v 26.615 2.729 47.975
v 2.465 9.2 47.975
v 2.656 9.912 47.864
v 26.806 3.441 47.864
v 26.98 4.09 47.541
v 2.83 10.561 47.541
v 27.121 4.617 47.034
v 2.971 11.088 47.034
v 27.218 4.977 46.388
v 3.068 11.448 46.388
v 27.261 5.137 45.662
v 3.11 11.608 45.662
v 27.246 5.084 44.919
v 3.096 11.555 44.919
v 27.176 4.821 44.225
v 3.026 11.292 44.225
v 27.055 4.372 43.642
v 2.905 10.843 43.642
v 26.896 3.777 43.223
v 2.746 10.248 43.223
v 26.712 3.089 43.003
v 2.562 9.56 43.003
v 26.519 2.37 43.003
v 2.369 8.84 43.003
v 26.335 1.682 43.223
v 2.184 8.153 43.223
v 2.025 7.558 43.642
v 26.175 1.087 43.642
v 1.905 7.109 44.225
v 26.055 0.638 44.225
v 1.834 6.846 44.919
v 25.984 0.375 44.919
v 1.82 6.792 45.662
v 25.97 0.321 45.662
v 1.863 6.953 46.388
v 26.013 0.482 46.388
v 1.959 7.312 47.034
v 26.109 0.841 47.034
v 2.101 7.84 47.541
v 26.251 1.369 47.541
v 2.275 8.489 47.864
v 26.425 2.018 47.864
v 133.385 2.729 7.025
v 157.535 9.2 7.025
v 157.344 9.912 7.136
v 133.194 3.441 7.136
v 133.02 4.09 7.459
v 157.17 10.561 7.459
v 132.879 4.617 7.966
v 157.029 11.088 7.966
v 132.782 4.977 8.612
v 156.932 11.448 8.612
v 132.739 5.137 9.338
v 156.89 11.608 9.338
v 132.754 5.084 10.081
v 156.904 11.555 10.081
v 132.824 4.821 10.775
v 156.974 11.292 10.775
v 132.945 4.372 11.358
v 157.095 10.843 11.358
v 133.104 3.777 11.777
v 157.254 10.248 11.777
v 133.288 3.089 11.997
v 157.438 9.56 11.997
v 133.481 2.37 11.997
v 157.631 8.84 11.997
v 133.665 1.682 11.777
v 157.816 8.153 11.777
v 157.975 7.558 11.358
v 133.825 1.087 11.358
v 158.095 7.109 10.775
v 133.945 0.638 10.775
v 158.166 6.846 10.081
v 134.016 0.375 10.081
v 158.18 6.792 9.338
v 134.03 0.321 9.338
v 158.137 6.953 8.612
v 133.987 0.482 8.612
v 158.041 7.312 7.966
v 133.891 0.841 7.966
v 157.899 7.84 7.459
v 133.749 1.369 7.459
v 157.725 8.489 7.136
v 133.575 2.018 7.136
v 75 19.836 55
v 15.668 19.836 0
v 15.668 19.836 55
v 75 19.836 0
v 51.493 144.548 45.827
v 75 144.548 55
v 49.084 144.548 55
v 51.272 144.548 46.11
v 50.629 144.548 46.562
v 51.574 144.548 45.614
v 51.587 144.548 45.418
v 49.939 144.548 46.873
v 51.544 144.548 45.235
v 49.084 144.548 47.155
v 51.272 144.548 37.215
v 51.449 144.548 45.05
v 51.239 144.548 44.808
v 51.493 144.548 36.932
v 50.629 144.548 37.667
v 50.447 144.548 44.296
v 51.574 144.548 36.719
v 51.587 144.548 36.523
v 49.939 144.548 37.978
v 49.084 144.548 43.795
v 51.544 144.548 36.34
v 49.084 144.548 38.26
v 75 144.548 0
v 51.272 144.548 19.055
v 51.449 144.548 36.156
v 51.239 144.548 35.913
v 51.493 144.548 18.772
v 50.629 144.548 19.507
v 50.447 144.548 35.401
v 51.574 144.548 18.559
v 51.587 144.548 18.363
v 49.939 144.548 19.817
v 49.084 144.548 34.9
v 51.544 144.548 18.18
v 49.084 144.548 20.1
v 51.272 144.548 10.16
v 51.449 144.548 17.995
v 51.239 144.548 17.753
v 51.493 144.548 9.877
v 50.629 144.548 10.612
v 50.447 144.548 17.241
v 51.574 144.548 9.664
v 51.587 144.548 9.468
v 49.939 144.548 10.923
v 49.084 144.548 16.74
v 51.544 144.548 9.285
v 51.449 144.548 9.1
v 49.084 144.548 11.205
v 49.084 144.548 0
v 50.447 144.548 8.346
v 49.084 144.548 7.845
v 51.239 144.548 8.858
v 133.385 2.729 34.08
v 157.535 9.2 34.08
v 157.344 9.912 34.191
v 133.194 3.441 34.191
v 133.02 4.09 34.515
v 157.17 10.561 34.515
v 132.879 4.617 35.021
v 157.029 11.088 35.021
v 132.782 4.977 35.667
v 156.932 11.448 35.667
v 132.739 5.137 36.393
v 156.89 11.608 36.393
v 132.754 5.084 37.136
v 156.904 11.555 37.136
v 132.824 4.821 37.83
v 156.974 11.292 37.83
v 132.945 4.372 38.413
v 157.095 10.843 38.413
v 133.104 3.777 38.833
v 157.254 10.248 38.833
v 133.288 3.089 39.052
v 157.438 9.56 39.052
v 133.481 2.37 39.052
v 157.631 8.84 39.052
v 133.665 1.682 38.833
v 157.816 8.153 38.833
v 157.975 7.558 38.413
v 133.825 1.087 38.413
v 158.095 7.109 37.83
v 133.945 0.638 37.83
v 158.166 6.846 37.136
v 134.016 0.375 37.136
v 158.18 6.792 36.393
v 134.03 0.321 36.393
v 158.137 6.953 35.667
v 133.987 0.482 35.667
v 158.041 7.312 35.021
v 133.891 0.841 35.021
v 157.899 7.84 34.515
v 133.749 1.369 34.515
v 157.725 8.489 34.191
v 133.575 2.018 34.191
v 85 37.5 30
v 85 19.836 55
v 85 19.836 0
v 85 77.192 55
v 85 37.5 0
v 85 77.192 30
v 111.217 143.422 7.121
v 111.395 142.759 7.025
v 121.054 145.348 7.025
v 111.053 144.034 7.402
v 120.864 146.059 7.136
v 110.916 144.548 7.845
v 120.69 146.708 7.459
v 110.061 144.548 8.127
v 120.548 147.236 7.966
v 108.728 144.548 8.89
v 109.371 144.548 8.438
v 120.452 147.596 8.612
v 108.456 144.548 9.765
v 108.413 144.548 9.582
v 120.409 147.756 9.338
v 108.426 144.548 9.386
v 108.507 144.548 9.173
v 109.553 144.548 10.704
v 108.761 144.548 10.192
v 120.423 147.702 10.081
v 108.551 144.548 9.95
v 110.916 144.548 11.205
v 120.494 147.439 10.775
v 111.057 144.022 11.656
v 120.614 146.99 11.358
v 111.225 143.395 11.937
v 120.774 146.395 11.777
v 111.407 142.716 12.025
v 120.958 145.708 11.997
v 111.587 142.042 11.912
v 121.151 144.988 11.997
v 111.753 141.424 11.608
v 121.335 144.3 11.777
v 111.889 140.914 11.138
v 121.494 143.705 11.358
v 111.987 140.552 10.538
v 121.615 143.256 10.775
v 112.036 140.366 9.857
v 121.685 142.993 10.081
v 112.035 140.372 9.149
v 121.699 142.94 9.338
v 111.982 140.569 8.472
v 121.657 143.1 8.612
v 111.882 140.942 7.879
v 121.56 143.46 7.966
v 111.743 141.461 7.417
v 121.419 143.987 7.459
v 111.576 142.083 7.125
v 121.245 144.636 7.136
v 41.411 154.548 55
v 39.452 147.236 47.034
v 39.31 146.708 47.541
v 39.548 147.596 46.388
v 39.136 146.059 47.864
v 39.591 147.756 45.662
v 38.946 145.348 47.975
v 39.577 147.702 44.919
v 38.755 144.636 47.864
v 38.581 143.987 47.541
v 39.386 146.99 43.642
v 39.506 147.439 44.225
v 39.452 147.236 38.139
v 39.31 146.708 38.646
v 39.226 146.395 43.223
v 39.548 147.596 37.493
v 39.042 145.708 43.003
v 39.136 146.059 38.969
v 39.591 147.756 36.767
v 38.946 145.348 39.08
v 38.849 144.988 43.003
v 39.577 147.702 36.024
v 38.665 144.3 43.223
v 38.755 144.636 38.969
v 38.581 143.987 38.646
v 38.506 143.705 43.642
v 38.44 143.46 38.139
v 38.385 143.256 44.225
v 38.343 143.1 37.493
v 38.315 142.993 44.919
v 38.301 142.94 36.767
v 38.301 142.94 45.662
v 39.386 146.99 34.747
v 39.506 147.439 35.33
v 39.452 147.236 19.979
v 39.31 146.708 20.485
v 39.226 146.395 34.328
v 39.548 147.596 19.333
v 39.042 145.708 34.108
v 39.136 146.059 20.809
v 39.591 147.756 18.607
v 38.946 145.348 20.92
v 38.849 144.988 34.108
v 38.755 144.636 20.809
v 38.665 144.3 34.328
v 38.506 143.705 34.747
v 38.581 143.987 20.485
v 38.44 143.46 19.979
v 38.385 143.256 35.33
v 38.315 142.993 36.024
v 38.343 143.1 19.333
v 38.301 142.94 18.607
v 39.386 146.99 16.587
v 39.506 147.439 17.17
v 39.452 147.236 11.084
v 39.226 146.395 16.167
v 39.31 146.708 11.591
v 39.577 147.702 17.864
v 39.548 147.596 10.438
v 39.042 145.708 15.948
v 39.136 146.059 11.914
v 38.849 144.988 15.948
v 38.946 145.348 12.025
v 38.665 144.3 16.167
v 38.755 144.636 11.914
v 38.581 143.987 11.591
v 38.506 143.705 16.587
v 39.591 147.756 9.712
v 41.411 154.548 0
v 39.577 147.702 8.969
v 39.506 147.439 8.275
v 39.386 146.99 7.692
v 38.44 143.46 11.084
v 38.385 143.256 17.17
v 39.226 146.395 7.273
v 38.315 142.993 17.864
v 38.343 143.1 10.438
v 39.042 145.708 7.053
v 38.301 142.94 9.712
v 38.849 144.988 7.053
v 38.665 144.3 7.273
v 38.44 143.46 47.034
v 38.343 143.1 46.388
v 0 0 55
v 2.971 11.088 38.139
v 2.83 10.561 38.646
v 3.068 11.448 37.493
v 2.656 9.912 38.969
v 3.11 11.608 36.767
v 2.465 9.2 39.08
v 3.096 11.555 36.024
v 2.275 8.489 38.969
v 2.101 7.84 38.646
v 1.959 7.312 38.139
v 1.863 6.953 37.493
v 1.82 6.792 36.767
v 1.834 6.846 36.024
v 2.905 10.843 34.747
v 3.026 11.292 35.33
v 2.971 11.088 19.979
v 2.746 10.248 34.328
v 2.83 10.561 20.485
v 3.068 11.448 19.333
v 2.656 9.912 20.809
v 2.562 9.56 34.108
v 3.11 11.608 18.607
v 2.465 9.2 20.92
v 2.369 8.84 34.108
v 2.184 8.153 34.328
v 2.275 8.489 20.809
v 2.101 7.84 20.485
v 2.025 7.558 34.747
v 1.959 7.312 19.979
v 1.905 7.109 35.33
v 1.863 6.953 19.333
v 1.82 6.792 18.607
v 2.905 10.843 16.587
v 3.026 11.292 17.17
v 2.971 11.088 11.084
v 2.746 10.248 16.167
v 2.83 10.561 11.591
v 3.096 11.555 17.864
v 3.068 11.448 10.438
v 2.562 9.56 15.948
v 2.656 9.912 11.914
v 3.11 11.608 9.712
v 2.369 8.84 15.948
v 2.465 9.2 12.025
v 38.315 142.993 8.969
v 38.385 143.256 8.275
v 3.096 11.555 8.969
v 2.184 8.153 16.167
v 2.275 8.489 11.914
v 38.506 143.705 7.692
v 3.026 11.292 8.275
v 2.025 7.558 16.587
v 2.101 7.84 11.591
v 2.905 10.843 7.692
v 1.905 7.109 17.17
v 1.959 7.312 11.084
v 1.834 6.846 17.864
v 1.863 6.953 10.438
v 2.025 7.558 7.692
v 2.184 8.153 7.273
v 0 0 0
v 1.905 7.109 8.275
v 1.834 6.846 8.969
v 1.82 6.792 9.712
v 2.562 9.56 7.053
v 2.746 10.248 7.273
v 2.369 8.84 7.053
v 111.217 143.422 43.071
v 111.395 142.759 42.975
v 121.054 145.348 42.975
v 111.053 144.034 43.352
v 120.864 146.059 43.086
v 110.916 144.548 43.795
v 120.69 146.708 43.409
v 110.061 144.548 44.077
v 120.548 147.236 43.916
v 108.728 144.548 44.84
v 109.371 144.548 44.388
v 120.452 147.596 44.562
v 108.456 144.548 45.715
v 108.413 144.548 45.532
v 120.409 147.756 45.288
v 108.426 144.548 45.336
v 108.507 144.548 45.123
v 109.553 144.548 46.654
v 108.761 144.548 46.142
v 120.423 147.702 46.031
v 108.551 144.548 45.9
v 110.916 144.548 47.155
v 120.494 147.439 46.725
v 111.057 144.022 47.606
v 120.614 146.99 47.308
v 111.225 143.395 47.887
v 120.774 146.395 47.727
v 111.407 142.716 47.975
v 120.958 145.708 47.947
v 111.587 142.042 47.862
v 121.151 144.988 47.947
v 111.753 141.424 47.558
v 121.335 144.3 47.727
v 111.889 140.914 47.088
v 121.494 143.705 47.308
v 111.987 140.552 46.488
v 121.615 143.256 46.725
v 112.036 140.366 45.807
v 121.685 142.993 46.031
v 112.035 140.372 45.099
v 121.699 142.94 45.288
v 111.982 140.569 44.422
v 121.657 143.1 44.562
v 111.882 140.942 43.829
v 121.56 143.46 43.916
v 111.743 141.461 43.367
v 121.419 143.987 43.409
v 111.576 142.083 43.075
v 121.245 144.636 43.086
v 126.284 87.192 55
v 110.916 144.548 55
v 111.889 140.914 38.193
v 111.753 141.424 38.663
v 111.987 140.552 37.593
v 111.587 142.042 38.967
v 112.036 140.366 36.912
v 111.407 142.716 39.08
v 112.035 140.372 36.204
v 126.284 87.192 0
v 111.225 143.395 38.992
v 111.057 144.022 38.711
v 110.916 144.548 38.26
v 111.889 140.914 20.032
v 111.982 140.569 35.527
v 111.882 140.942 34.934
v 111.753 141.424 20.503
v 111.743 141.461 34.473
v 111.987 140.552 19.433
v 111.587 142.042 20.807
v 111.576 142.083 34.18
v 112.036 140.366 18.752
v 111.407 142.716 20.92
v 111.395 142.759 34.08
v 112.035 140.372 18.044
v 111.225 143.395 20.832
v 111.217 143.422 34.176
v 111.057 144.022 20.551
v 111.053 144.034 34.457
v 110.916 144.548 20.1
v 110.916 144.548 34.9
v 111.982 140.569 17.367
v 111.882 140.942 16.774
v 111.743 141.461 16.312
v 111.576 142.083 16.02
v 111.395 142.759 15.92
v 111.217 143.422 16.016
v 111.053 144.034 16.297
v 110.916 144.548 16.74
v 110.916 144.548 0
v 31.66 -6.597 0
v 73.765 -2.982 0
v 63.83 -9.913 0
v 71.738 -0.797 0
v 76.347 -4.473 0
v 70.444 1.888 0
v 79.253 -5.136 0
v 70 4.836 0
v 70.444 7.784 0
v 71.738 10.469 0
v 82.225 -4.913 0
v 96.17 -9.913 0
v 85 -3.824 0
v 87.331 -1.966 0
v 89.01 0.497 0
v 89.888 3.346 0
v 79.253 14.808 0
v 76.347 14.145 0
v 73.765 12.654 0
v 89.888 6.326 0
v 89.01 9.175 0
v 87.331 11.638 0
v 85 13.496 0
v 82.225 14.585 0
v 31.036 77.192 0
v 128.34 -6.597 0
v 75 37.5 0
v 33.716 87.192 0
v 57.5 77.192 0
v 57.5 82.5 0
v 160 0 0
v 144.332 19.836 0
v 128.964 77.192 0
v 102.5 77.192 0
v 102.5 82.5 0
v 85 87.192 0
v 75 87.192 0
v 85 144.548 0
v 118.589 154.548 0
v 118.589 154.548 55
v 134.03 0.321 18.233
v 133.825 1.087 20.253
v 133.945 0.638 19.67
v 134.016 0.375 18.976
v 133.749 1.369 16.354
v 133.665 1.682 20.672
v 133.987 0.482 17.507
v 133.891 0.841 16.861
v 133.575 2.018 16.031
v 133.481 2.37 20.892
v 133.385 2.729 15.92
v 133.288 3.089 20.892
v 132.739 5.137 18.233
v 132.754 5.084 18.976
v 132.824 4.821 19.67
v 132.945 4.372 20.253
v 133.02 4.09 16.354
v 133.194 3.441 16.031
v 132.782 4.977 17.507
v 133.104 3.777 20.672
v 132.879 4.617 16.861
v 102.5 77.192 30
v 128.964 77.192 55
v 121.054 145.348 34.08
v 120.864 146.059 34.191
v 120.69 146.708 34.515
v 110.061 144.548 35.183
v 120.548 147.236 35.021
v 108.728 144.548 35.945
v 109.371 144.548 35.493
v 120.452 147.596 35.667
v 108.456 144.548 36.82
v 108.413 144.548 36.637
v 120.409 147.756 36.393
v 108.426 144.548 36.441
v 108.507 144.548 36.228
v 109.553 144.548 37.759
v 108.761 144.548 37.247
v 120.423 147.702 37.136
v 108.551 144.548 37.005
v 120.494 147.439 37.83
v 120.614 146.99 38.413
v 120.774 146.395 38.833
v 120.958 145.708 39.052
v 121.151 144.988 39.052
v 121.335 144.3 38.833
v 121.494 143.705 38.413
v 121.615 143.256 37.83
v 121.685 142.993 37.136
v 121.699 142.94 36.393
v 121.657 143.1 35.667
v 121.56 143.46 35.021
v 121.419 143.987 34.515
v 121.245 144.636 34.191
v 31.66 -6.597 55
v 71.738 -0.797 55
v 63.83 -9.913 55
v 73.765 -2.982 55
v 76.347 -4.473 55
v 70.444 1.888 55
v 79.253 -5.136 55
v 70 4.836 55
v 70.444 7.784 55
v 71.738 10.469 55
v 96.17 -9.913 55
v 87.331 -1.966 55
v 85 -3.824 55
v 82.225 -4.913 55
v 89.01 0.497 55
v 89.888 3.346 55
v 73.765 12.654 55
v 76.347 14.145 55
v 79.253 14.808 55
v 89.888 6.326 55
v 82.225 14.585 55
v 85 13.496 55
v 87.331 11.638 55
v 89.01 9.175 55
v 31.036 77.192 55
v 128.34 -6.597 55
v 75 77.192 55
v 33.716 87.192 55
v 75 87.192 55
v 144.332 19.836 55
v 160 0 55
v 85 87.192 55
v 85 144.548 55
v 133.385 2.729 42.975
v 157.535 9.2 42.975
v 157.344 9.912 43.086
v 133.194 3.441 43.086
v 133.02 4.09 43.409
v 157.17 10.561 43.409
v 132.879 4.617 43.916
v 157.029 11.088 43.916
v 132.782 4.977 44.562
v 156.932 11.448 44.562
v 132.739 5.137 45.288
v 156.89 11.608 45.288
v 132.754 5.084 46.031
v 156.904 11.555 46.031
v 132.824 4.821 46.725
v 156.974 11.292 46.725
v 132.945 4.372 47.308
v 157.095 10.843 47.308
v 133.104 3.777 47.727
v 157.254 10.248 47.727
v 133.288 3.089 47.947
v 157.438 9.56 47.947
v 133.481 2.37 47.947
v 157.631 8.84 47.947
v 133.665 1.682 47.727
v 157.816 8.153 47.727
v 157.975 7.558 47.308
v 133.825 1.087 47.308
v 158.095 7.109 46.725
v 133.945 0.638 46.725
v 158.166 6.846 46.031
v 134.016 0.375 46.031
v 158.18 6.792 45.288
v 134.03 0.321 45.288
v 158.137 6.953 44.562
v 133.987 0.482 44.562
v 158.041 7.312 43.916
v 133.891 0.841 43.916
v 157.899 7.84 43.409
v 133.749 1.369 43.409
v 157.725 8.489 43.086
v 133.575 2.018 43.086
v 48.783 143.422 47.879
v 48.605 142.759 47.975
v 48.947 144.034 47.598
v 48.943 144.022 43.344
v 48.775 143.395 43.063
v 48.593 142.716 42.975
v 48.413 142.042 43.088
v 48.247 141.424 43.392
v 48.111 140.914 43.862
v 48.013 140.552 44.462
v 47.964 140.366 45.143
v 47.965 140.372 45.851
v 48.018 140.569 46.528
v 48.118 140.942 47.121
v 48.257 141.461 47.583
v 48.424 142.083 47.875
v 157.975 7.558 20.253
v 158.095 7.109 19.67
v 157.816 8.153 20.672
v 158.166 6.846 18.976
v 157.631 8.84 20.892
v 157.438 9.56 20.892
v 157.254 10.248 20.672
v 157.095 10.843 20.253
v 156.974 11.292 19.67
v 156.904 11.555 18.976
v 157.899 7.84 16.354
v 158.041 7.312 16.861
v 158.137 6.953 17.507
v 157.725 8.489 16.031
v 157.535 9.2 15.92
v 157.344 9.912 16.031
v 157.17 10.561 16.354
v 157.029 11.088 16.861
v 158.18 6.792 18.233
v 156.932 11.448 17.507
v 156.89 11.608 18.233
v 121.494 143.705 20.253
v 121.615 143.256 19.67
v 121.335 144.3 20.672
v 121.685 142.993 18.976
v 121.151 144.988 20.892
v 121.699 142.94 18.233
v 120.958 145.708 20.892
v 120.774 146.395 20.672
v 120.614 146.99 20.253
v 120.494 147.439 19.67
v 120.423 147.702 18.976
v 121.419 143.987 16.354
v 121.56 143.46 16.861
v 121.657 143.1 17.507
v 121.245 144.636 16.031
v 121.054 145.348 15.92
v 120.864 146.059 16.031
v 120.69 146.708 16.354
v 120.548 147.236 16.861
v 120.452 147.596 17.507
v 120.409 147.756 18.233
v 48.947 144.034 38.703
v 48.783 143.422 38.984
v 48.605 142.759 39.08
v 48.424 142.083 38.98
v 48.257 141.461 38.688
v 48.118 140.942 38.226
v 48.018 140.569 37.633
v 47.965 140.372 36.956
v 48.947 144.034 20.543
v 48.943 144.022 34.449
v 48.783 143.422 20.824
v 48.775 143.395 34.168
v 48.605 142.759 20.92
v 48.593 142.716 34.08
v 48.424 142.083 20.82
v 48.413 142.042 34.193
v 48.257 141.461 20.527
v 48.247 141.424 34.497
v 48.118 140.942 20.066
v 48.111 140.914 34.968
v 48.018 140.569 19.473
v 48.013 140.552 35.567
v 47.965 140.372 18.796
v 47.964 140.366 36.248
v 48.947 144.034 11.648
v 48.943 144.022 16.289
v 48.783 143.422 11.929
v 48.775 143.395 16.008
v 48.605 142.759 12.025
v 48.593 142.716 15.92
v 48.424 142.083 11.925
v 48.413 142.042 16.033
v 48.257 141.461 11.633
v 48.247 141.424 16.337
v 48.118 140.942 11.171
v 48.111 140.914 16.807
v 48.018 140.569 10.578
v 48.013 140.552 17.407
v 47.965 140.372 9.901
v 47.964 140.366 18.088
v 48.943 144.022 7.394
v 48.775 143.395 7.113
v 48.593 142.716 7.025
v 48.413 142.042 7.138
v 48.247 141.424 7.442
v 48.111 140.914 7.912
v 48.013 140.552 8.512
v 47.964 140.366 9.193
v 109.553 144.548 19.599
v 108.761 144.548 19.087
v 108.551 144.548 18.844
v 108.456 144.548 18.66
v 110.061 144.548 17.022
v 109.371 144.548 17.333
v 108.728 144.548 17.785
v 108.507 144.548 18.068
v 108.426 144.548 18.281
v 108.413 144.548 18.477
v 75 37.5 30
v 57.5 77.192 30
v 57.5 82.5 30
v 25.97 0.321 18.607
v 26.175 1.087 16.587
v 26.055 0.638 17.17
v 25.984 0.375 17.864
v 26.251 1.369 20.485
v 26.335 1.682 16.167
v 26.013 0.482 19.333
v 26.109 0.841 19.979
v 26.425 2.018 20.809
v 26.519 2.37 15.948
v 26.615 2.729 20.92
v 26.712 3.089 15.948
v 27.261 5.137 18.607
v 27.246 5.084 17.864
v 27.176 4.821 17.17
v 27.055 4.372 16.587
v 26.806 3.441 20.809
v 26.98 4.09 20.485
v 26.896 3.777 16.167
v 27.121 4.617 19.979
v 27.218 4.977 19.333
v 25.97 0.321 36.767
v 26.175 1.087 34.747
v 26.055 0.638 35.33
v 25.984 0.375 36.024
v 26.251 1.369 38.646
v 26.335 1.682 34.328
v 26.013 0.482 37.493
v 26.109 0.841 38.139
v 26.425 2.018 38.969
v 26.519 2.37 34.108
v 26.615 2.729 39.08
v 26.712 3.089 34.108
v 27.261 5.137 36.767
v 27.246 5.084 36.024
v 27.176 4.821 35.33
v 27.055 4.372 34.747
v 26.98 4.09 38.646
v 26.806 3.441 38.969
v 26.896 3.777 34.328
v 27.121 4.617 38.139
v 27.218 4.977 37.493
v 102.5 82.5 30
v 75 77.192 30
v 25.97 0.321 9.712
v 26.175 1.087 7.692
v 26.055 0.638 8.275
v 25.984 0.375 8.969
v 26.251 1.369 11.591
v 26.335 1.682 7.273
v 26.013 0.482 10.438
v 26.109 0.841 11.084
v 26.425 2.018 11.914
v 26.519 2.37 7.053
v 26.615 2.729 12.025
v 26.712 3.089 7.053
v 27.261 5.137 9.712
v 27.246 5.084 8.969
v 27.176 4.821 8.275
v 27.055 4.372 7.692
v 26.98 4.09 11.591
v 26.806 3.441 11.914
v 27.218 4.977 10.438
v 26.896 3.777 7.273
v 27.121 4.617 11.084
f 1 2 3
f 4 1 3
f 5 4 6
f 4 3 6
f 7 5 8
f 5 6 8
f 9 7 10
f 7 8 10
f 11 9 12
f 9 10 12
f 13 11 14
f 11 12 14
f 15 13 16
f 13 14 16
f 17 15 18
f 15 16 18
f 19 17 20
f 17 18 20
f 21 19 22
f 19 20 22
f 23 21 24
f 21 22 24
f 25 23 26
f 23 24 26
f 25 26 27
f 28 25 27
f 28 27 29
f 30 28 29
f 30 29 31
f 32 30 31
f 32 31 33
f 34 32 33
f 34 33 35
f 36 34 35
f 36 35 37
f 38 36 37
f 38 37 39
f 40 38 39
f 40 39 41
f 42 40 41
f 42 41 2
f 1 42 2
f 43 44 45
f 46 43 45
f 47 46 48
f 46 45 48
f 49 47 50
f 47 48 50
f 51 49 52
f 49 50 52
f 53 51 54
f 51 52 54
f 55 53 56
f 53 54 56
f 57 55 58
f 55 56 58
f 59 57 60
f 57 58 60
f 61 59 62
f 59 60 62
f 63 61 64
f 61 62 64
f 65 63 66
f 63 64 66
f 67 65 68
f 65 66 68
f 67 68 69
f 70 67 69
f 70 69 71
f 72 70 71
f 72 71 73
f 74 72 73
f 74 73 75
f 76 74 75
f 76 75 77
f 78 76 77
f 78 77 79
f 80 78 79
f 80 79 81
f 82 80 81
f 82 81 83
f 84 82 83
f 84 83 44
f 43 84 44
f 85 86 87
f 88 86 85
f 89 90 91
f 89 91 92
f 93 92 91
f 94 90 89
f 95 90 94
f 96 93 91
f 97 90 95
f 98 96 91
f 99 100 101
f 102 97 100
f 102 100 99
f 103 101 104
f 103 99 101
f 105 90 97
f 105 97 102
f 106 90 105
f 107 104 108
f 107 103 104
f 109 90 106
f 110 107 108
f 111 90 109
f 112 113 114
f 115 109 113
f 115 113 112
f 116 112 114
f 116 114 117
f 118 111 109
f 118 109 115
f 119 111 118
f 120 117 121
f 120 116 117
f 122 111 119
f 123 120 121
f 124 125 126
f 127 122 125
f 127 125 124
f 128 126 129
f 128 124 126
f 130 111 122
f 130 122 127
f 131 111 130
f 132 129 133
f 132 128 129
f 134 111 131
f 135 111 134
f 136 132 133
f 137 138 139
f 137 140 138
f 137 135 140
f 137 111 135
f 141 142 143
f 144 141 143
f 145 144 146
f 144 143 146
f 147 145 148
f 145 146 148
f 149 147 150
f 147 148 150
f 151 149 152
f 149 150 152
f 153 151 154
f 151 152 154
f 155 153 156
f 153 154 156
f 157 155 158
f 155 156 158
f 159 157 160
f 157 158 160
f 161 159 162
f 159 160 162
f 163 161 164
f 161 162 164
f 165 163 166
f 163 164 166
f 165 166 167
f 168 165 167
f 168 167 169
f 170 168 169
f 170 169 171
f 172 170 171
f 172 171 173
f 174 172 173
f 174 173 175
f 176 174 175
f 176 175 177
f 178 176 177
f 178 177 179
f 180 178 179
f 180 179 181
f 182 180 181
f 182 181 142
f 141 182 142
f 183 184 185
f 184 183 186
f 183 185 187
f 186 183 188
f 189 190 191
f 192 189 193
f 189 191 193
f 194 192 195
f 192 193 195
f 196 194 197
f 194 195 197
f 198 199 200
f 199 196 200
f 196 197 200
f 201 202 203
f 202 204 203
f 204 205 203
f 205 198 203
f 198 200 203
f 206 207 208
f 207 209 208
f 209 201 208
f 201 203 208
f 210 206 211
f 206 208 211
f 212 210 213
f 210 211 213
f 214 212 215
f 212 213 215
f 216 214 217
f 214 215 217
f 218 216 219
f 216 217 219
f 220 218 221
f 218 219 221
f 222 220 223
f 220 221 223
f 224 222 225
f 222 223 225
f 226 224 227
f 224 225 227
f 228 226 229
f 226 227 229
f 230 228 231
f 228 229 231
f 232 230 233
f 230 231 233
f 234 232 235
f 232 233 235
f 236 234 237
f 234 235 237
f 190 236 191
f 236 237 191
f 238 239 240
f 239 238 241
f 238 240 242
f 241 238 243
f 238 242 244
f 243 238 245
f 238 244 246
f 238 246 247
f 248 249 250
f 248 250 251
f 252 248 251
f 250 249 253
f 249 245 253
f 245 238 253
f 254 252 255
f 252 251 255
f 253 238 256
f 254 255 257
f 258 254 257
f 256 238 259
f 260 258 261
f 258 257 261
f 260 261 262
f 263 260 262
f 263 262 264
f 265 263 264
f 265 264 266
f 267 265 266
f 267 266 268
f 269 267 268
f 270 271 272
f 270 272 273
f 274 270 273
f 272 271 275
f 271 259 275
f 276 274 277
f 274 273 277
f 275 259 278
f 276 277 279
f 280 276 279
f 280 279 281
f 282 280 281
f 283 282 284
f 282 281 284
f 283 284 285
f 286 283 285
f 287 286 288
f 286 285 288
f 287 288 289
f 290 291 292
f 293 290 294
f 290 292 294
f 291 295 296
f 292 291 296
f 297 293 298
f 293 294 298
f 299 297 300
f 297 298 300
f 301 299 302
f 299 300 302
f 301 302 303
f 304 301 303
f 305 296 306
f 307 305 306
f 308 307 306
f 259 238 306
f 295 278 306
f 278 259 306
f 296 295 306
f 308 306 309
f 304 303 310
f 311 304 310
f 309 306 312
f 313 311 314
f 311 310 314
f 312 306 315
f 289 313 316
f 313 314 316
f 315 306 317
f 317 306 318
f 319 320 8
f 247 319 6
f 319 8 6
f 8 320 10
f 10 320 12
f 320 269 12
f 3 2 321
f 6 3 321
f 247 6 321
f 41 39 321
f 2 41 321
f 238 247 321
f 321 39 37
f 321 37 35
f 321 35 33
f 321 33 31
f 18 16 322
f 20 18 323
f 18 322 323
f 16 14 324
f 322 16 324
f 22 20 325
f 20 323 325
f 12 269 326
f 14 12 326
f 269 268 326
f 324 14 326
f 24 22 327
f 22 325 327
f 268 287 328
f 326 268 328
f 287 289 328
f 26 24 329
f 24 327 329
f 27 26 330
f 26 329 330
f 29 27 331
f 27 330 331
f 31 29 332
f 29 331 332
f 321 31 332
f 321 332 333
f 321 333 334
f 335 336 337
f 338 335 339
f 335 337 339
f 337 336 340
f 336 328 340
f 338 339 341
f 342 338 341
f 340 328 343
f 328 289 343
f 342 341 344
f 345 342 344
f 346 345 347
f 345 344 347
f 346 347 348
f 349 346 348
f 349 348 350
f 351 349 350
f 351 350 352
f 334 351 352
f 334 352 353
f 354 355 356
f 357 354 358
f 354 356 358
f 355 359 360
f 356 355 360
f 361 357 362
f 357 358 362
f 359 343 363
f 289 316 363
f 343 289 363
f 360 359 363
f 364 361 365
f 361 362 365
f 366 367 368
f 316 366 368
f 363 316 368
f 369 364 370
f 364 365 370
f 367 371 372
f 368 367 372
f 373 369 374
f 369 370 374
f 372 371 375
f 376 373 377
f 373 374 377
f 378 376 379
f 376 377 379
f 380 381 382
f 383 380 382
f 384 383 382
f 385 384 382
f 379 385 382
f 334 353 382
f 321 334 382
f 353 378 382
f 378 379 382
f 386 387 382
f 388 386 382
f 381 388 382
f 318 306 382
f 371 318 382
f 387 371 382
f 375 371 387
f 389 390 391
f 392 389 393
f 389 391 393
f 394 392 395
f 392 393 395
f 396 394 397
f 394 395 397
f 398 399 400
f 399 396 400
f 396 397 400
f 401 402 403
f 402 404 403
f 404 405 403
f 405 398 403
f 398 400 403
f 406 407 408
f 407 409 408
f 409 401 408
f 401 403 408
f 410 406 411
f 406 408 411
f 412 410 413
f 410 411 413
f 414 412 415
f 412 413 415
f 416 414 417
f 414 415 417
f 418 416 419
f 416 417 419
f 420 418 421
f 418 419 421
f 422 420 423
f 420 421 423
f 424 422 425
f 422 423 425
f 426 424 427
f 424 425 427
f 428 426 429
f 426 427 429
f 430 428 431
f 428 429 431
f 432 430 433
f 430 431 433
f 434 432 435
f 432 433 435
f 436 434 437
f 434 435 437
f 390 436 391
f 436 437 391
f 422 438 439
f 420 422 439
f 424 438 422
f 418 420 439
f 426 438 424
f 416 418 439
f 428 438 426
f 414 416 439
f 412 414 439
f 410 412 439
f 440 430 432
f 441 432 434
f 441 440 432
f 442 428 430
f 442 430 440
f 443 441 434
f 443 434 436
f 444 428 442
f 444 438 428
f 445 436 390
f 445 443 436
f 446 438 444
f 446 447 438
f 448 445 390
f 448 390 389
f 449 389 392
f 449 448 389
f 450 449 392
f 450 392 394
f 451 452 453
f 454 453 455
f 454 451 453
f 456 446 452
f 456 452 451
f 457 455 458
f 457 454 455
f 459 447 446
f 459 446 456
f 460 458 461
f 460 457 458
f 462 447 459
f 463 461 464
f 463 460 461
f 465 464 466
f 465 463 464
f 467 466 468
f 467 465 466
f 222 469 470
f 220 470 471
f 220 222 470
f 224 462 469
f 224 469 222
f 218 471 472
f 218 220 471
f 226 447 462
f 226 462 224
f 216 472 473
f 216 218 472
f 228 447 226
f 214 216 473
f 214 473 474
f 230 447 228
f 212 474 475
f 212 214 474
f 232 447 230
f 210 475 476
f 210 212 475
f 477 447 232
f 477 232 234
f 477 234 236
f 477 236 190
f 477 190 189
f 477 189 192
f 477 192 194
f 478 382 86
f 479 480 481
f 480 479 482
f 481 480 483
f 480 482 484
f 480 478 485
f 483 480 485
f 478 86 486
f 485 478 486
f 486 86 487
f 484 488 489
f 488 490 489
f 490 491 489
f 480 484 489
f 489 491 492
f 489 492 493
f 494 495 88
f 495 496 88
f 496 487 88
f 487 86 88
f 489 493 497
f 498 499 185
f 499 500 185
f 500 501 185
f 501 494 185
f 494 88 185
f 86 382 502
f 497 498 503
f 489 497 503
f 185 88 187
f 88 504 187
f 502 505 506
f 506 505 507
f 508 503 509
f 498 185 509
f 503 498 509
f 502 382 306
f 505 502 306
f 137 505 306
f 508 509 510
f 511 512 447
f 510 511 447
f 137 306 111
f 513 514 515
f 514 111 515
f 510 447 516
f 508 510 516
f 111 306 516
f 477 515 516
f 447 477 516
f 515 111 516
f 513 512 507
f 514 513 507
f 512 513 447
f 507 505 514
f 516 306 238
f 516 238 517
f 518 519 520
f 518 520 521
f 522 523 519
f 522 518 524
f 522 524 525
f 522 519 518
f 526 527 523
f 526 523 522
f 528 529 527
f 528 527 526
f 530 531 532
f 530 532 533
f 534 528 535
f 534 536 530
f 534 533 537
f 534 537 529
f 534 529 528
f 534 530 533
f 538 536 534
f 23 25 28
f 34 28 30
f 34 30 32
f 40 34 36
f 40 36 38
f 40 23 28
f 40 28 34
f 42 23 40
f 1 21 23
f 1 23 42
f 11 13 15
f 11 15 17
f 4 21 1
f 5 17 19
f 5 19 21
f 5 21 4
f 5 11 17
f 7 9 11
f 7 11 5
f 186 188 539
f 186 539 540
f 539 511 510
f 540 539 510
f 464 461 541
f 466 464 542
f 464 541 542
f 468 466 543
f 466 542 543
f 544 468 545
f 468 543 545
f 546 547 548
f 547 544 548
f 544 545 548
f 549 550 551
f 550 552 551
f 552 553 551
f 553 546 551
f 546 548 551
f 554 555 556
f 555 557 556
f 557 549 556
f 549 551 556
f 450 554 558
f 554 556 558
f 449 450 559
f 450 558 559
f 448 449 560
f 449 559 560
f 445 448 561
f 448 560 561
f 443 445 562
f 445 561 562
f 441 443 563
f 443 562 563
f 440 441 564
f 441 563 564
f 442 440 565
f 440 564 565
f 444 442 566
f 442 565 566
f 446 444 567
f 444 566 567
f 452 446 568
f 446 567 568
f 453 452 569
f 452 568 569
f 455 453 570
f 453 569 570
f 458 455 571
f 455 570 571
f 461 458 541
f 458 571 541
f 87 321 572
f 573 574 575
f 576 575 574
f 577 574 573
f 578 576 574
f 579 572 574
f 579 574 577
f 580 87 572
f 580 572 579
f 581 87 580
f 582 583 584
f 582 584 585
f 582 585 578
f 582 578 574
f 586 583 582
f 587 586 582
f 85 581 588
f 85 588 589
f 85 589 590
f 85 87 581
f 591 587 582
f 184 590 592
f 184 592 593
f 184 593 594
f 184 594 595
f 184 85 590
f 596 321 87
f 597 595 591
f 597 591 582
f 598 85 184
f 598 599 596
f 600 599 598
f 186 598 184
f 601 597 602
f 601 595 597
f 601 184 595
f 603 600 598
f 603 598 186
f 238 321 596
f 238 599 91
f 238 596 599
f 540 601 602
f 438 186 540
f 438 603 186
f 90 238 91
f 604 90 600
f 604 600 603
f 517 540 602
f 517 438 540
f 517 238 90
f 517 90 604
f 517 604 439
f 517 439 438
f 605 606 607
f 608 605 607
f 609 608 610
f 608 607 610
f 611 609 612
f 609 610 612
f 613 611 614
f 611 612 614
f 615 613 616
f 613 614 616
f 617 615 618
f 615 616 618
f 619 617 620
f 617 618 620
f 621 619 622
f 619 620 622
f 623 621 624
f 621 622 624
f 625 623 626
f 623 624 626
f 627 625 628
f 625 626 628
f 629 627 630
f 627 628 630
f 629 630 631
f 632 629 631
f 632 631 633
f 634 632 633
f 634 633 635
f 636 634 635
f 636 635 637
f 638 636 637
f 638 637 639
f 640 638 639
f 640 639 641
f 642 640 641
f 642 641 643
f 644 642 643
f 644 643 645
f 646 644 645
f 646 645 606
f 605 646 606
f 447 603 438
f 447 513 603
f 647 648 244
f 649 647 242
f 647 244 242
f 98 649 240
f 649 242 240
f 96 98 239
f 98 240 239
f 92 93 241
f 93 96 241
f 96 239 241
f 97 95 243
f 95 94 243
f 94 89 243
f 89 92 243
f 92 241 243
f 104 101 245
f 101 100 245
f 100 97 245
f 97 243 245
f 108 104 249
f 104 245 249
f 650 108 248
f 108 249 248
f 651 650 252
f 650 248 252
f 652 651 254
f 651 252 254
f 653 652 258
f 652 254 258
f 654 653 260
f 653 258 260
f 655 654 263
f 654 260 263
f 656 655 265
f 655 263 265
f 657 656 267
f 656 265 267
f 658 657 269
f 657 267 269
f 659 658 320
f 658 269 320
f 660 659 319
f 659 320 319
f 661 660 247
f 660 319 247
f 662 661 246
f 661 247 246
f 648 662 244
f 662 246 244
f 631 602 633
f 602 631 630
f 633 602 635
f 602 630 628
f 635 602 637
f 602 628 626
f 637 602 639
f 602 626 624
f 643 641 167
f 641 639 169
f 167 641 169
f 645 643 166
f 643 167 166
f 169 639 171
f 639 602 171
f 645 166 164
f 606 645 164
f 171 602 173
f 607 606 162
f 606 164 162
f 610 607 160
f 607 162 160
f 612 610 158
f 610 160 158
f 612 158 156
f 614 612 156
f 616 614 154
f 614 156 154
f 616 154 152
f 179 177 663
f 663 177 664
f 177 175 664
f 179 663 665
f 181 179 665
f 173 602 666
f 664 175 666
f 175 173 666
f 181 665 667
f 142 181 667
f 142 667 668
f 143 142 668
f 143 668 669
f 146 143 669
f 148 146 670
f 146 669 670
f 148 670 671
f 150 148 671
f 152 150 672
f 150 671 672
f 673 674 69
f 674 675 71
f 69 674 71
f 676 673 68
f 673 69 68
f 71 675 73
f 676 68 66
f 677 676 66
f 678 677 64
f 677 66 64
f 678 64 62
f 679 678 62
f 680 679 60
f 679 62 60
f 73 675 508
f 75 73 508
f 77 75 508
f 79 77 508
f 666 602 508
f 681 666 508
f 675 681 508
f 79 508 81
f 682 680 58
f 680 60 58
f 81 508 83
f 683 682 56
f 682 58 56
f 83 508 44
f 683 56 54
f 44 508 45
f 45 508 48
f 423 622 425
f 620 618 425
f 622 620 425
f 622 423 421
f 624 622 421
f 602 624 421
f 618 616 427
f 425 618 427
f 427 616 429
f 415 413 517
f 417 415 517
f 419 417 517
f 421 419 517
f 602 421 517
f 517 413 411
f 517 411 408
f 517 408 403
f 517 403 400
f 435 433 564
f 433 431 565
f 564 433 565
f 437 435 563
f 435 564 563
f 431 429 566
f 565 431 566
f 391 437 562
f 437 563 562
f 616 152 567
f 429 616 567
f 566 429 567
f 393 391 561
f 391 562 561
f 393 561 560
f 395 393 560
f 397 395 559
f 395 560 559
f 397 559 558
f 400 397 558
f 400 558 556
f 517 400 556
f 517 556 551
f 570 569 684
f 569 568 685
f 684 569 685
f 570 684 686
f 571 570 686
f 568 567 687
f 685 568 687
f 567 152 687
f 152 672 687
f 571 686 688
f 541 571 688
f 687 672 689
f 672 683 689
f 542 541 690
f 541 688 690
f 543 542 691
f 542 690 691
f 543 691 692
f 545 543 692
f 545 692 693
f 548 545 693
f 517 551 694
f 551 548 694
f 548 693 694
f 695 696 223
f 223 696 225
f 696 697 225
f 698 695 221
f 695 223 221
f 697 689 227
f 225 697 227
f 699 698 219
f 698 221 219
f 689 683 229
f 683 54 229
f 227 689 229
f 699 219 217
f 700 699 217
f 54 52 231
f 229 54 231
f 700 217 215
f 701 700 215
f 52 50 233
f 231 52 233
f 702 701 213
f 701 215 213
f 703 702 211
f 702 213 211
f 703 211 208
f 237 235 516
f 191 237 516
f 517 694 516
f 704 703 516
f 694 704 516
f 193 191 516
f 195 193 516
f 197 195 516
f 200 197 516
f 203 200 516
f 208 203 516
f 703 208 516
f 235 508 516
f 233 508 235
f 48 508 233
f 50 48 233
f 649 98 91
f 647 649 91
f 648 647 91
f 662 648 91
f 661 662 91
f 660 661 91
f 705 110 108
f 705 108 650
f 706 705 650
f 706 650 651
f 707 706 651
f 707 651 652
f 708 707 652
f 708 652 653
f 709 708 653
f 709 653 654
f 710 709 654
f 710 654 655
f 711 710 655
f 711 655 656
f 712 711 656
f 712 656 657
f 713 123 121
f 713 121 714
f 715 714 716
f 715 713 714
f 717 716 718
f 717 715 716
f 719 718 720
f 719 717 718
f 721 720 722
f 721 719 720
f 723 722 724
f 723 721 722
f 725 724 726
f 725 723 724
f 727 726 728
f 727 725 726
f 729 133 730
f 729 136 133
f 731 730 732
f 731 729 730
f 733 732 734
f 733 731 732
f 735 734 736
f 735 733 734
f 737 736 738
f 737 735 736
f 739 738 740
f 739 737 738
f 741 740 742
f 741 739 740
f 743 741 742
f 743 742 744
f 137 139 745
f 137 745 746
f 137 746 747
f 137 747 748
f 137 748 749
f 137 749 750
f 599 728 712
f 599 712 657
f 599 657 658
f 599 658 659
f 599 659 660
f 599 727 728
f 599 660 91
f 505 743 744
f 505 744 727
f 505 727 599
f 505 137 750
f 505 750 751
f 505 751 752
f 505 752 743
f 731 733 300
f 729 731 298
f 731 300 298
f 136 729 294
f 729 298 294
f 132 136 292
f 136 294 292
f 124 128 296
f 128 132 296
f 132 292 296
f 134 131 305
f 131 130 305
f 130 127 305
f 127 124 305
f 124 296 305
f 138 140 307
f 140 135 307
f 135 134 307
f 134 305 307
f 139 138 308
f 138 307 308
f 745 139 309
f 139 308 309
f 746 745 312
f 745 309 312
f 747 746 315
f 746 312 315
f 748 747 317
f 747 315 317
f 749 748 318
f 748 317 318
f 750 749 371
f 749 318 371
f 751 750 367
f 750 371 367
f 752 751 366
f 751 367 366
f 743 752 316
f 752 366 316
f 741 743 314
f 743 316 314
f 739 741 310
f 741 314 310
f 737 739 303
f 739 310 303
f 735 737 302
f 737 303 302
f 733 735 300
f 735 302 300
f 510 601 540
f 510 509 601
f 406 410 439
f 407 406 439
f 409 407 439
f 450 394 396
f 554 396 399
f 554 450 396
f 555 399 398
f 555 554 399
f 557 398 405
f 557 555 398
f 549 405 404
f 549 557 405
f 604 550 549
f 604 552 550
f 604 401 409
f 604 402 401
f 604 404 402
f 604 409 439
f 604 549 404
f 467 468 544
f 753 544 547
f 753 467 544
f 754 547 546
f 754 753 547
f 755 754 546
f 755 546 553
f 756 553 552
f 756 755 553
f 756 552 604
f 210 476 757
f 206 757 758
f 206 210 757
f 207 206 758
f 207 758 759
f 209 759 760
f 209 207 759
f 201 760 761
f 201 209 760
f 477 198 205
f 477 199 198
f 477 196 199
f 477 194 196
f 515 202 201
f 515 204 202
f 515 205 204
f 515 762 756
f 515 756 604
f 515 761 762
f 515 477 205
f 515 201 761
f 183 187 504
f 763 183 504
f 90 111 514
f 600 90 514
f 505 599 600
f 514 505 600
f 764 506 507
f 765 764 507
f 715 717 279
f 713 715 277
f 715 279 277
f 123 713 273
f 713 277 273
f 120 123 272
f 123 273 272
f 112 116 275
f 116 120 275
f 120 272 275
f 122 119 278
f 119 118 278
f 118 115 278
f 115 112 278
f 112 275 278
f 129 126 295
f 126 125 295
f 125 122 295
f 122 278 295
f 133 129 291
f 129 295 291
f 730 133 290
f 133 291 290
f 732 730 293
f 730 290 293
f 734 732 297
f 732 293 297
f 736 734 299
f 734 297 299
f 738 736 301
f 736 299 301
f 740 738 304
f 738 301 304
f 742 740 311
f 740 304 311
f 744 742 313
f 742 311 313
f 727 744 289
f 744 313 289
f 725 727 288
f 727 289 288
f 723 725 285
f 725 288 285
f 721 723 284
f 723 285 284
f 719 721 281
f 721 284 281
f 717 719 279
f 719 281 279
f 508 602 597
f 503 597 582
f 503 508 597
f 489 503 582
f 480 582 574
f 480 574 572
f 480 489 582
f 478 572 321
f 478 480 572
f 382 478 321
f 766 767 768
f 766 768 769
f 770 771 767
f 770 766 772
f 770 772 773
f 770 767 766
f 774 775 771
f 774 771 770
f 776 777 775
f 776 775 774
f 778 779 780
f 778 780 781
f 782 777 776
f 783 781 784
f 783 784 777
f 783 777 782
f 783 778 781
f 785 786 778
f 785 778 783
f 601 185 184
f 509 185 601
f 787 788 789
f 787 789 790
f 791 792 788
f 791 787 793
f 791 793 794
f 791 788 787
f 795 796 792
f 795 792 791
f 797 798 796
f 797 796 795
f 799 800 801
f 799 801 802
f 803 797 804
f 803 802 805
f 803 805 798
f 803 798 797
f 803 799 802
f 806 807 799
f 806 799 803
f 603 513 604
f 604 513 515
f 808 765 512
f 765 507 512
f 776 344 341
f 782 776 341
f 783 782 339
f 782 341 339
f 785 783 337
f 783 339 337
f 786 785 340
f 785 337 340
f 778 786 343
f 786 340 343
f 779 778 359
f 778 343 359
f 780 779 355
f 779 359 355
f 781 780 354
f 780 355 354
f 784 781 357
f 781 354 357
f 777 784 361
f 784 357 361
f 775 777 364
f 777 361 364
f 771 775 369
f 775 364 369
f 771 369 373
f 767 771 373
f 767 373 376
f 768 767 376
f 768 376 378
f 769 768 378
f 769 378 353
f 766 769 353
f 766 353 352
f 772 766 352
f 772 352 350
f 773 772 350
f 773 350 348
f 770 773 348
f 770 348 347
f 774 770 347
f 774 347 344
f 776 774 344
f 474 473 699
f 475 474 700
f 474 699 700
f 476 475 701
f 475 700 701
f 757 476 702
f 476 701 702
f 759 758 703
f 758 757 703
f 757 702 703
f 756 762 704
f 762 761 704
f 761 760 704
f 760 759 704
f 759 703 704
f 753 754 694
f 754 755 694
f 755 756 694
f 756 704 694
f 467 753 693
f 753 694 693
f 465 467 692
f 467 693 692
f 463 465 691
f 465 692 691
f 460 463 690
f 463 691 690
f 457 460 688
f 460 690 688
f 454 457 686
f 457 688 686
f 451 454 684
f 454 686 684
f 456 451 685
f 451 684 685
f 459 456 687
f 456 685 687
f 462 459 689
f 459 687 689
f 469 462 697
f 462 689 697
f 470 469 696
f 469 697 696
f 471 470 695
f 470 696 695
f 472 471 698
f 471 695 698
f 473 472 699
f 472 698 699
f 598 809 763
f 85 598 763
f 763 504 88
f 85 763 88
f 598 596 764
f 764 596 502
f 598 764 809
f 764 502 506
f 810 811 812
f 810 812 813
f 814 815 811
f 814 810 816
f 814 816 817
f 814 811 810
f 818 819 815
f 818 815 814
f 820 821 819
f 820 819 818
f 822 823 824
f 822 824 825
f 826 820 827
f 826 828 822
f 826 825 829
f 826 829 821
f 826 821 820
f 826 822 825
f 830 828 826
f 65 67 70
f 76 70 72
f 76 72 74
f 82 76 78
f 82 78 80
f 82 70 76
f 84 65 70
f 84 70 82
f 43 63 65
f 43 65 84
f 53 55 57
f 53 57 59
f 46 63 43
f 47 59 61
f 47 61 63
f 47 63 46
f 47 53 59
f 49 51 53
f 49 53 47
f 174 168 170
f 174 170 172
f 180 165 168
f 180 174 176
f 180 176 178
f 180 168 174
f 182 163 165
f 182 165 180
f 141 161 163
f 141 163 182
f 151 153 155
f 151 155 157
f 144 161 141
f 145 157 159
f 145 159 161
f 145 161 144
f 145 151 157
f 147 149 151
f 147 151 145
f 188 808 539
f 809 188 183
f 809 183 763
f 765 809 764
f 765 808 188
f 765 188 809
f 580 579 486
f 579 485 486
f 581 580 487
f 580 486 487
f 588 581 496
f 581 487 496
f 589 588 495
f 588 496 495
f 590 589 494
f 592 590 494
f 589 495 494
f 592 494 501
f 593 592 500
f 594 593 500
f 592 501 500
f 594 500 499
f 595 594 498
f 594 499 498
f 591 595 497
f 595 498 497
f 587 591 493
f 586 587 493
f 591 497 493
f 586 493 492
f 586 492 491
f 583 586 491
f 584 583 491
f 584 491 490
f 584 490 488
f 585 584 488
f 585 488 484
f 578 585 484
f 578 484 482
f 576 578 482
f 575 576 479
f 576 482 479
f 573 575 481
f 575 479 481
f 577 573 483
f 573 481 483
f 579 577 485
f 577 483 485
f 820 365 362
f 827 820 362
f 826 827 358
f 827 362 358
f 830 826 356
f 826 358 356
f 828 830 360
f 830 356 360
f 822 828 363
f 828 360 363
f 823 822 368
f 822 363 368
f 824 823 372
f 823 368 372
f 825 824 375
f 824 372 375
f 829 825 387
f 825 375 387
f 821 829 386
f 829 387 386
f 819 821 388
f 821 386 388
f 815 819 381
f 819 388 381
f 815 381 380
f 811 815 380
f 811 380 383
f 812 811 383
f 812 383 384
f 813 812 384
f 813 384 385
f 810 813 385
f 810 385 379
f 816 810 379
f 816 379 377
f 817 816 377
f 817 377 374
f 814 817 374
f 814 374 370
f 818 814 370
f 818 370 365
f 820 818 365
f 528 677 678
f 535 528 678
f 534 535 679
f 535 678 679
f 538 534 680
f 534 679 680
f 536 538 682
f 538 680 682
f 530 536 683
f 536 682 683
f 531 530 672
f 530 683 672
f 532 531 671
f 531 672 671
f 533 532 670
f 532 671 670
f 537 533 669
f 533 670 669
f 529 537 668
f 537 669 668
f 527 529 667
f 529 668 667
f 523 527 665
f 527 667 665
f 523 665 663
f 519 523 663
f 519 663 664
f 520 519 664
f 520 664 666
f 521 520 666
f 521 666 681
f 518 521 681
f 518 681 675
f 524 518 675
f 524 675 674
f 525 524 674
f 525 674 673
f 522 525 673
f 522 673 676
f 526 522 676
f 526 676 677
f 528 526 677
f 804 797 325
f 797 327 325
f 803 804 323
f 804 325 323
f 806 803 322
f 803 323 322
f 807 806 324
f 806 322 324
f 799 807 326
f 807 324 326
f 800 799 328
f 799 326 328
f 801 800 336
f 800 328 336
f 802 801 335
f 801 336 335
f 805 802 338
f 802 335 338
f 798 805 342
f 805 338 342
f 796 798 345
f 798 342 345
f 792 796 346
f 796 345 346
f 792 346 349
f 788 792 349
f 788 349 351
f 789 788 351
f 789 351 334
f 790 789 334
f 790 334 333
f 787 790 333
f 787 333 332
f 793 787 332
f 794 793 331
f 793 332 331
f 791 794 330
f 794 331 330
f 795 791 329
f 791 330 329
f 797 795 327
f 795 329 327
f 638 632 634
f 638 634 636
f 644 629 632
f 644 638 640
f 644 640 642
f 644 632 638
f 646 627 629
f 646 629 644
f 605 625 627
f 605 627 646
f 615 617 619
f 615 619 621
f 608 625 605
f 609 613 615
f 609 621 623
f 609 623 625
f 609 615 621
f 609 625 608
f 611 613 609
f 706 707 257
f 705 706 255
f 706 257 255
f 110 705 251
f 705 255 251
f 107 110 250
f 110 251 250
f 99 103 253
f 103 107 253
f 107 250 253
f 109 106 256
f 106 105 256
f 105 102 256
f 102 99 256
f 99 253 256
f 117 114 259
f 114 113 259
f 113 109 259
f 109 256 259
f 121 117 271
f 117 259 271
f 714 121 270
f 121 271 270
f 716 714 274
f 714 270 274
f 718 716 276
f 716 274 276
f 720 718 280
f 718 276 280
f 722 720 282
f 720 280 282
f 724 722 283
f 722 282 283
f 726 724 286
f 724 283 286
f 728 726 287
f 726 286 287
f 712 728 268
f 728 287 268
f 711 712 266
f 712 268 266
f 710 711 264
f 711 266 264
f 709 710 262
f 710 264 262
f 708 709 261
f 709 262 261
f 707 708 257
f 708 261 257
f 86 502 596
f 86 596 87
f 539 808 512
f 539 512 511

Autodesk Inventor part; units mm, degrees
ref_plane "YZ Plane" through (0, 0, 0) normal (1, 0, 0) x (0, 1, 0)
ref_plane "XZ Plane" through (0, 0, 0) normal (0, 1, 0) x (-1, 0, 0)
ref_plane "XY Plane" through (0, 0, 0) normal (0, 0, 1) x (1, 0, 0)
sketch "Sketch1" plane through (0, 0, 0) normal (0, 0, 1) x (1, 0, 0)
  line L0 (0, 0) -> (160, 0)
  line L1 (160, 0) -> (118.589, 154.5481)
  line L2 (41.411, 154.5481) -> (0, 0)
  line L3 (41.411, 154.5481) -> (118.589, 154.5481)
  dimension "d0" = 160
  dimension "d1" = 160
  dimension "d2" = 75
  dimension "d8" = 75
extrude "Extrusion1" add sketch "Sketch1" along normal blind 55
sketch "Sketch7" plane through (0, 0, 0) normal (0, 0, -1) x (-1, 0, 0)
  circle A0 centre (-80, 304.672) radius 315 construction
  line L0 (0, 0) -> (-160, 0) projected
  arc A1 (-160, 0) -> (0, 0) centre (-80, 304.672) ccw
  dimension "d28" = 630
extrude "Extrusion6" add sketch "Sketch7" against normal blind 55
sketch "Sketch19" plane through (0, 0, 0) normal (0, 0, -1) x (-1, 0, 0)
  circle A0 centre (-80, 4.836) radius 10
  line L0 (-118.589, 154.5481) -> (-41.411, 154.5481) projected
  line L1 (-80, 154.5481) -> (-80, -10.328)
  arc A1 (-160, 0) -> (0, 0) centre (-80, 304.672) ccw projected
  dimension "d112" = 20
  dimension "d113" = 15.164
extrude "Extrusion19" cut sketch "Sketch19" against normal through all
sketch "Sketch20" plane through (0, 0, 0) normal (0, 0, -1) x (-1, 0, 0)
  line L0 (-41.411, 154.5481) -> (0, 0) projected
  circle A0 centre (-80, 4.836) radius 10 projected
  line L1 (-41.411, 154.5481) -> (0, 0) projected
  line L2 (-118.589, 154.5481) -> (-41.411, 154.5481) projected
  line L3 (-160, 0) -> (-118.589, 154.5481) projected
  arc A1 (-160, 0) -> (0, 0) centre (-80, 304.672) ccw projected
  line L4 (-49.0843, 144.5481) -> (-12.3033, 7.2797)
  arc A2 (-147.6967, 7.2797) -> (-12.3033, 7.2797) centre (-80, 304.672) ccw
  line L5 (-147.6967, 7.2797) -> (-110.9157, 144.5481)
  line L6 (-110.9157, 144.5481) -> (-49.0843, 144.5481)
  line L7 (-15.6678, 19.836) -> (-144.3322, 19.836)
  dimension "d116" = 10
  dimension "d119" = 15
extrude "Extrusion20" cut sketch "Sketch20" against normal through all contours L5 L6 L4 L7
sketch "Sketch21" plane through (0, 0, 0) normal (0, 0, -1) x (-1, 0, 0)
  line L0 (-110.9157, 144.5481) -> (-49.0843, 144.5481) projected
  line L1 (-75, 144.5481) -> (-75, 19.836)
  line L2 (-15.6678, 19.836) -> (-144.3322, 19.836) projected
  line L3 (-85, 19.836) -> (-85, 144.5481)
  line L4 (-85, 144.5481) -> (-75, 144.5481)
  line L5 (-75, 19.836) -> (-85, 19.836)
  point P0 (0, 0)
  point P1 (-80, 144.5481)
  point P2 (-80, 144.5481)
  dimension "d120" = 10
extrude "Extrusion21" add sketch "Sketch21" against normal blind 55
sketch "Sketch22" plane through (0, 0, 0) normal (0, 0, -1) x (-1, 0, 0)
  line L0 (-15.6678, 19.836) -> (-49.0843, 144.5481) projected
  line L1 (-33.7158, 87.1921) -> (-126.2842, 87.1921)
  line L2 (-110.9157, 144.5481) -> (-144.3322, 19.836) projected
  line L3 (-80, 87.1921) -> (-80, 77.1921)
  line L4 (-31.0363, 77.1921) -> (-128.9637, 77.1921)
  line L5 (-75, 19.836) -> (-75, 144.5481) projected
  line L6 (-33.7158, 87.1921) -> (-31.0363, 77.1921)
  line L7 (-126.2842, 87.1921) -> (-128.9637, 77.1921)
  point P0 (0, 0)
  point P1 (-80, 82.1921)
  point P2 (-75, 82.1921)
  dimension "d124" = 10
extrude "Extrusion22" add sketch "Sketch22" against normal blind 55
sketch "Sketch23" plane through (0, 0, 0) normal (0, 0, -1) x (-1, 0, 0)
  circle A0 centre (-80, 60) radius 55
  line L0 (-118.589, 154.5481) -> (-41.411, 154.5481) projected
  line L1 (-57.5, 82.5) -> (-102.5, 82.5)
  line L2 (-102.5, 82.5) -> (-102.5, 37.5)
  line L3 (-102.5, 37.5) -> (-57.5, 37.5)
  line L4 (-57.5, 37.5) -> (-57.5, 82.5)
  point P0 (0, 0)
  point P1 (-80, 154.5481)
  point P2 (-102.5, 60)
  point P3 (-80, 82.5)
  dimension "d127" = 110
  dimension "d128" = 60
  dimension "d129" = 45
  dimension "d130" = 45
extrude "Extrusion23" cut sketch "Sketch23" against normal blind 30 contours L4 L3 L2 L1
sketch "Sketch24" plane through (118.589, 154.5481, 55) normal (0.9659, 0.2588, 0) x (0, 0, -1)
  line L0 (45.475, -9.525) -> (45.475, -150.475) construction
  line L1 (9.525, -150.475) -> (9.525, -9.525) construction
  line L2 (0, -160) -> (0, 0) construction
  circle A0 centre (45.475, -150.475) radius 2.5
  circle A1 centre (9.525, -150.475) radius 2.5
  circle A2 centre (9.525, -9.525) radius 2.5
  circle A3 centre (45.475, -9.525) radius 2.5
  circle A4 centre (18.4199, -150.475) radius 2.5
  circle A5 centre (36.5801, -150.475) radius 2.5
  circle A6 centre (36.5801, -9.525) radius 2.5
  circle A7 centre (18.4199, -9.525) radius 2.5
  point P0 (55, -118.589)
  point P1 (9.525, -80)
  point P2 (0, -80)
  dimension "d133" = 140.95
  dimension "d134" = 140.95
  dimension "d135" = 9.525
  dimension "d136" = 9.525
  dimension "d137" = 5
  dimension "d138" = 5
  dimension "d139" = 5
  dimension "d140" = 5
  dimension "d141" = 5
  dimension "d142" = 5
  dimension "d143" = 5
  dimension "d144" = 5
  dimension "d145" = 18.4199
  dimension "d146" = 18.4199
extrude "Extrusion24" cut sketch "Sketch24" against normal blind 25
sketch "Sketch25" plane through (41.411, 154.5481, 0) normal (-0.9659, 0.2588, 0) x (0, 0, 1)
  line L0 (45.475, -9.525) -> (45.475, -150.475) construction
  line L1 (9.525, -150.475) -> (9.525, -9.525) construction
  circle A0 centre (45.475, -150.475) radius 2.5
  circle A1 centre (9.525, -150.475) radius 2.5
  circle A2 centre (9.525, -9.525) radius 2.5
  circle A3 centre (45.475, -9.525) radius 2.5
  circle A4 centre (18.4199, -150.475) radius 2.5
  circle A5 centre (36.5801, -150.475) radius 2.5
  circle A6 centre (36.5801, -9.525) radius 2.5
  circle A7 centre (18.4199, -9.525) radius 2.5
  line L2 (0, 0) -> (0, -160) projected
  line L3 (55, 0) -> (55, -160) projected
  point P0 (9.525, -80)
  point P1 (0, -80)
  dimension "d149" = 140.95
  dimension "d150" = 140.95
  dimension "d153" = 5
  dimension "d154" = 5
  dimension "d155" = 5
  dimension "d156" = 5
  dimension "d157" = 5
  dimension "d158" = 5
  dimension "d159" = 5
  dimension "d160" = 5
  dimension "d163" = 9.525
  dimension "d164" = 18.4199
  dimension "d165" = 18.4199
  dimension "d166" = 9.525
extrude "Extrusion25" cut sketch "Sketch25" against normal blind 25
properties part number "CA001" material "ABS Plastic"
